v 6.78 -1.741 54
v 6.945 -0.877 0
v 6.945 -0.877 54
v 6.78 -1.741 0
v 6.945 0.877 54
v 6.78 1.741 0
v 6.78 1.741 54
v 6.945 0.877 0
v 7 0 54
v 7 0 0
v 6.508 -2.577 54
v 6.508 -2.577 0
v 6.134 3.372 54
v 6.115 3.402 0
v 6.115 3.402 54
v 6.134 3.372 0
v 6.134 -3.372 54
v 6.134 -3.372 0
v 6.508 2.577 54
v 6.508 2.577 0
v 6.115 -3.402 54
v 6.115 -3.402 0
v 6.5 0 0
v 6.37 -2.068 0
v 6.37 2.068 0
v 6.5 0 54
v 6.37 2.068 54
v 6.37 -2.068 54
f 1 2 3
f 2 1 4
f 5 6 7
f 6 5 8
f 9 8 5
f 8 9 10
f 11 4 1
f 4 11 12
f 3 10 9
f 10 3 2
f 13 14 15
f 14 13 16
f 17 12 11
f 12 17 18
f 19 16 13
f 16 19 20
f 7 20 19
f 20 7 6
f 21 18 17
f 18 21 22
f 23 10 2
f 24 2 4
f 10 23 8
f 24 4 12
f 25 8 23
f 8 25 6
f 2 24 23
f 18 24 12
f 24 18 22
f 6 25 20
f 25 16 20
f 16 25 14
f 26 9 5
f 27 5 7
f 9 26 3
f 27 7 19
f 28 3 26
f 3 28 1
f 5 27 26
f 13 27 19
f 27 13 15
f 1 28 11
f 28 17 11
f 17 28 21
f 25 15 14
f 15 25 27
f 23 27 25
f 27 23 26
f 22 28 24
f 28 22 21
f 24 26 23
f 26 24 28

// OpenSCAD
$fn = 50;


difference() {
	union() {
		cylinder(h = 54, r = 7.0000000000);
		translate(v = [-13.0000000000, 0, 0]) {
			cylinder(h = 54, r = 7.0000000000);
		}
	}
	union() {
		cylinder(h = 54, r = 3.2500000000);
		cylinder(h = 54, r = 1.8000000000);
		cylinder(h = 54, r = 1.8000000000);
		cylinder(h = 54, r = 1.8000000000);
		translate(v = [-17.5000000000, 0, 0]) {
			hull() {
				translate(v = [-3.7500000000, 0.0000000000, 0]) {
					cylinder(h = 54, r = 7.5000000000);
				}
				translate(v = [3.7500000000, 0.0000000000, 0]) {
					cylinder(h = 54, r = 7.5000000000);
				}
				translate(v = [-3.7500000000, -0.0000000000, 0]) {
					cylinder(h = 54, r = 7.5000000000);
				}
				translate(v = [3.7500000000, -0.0000000000, 0]) {
					cylinder(h = 54, r = 7.5000000000);
				}
			}
		}
		translate(v = [-10.0000000000, 0, 0.0000000000]) {
			cylinder(h = 54, r = 16.5000000000);
		}
	}
}
